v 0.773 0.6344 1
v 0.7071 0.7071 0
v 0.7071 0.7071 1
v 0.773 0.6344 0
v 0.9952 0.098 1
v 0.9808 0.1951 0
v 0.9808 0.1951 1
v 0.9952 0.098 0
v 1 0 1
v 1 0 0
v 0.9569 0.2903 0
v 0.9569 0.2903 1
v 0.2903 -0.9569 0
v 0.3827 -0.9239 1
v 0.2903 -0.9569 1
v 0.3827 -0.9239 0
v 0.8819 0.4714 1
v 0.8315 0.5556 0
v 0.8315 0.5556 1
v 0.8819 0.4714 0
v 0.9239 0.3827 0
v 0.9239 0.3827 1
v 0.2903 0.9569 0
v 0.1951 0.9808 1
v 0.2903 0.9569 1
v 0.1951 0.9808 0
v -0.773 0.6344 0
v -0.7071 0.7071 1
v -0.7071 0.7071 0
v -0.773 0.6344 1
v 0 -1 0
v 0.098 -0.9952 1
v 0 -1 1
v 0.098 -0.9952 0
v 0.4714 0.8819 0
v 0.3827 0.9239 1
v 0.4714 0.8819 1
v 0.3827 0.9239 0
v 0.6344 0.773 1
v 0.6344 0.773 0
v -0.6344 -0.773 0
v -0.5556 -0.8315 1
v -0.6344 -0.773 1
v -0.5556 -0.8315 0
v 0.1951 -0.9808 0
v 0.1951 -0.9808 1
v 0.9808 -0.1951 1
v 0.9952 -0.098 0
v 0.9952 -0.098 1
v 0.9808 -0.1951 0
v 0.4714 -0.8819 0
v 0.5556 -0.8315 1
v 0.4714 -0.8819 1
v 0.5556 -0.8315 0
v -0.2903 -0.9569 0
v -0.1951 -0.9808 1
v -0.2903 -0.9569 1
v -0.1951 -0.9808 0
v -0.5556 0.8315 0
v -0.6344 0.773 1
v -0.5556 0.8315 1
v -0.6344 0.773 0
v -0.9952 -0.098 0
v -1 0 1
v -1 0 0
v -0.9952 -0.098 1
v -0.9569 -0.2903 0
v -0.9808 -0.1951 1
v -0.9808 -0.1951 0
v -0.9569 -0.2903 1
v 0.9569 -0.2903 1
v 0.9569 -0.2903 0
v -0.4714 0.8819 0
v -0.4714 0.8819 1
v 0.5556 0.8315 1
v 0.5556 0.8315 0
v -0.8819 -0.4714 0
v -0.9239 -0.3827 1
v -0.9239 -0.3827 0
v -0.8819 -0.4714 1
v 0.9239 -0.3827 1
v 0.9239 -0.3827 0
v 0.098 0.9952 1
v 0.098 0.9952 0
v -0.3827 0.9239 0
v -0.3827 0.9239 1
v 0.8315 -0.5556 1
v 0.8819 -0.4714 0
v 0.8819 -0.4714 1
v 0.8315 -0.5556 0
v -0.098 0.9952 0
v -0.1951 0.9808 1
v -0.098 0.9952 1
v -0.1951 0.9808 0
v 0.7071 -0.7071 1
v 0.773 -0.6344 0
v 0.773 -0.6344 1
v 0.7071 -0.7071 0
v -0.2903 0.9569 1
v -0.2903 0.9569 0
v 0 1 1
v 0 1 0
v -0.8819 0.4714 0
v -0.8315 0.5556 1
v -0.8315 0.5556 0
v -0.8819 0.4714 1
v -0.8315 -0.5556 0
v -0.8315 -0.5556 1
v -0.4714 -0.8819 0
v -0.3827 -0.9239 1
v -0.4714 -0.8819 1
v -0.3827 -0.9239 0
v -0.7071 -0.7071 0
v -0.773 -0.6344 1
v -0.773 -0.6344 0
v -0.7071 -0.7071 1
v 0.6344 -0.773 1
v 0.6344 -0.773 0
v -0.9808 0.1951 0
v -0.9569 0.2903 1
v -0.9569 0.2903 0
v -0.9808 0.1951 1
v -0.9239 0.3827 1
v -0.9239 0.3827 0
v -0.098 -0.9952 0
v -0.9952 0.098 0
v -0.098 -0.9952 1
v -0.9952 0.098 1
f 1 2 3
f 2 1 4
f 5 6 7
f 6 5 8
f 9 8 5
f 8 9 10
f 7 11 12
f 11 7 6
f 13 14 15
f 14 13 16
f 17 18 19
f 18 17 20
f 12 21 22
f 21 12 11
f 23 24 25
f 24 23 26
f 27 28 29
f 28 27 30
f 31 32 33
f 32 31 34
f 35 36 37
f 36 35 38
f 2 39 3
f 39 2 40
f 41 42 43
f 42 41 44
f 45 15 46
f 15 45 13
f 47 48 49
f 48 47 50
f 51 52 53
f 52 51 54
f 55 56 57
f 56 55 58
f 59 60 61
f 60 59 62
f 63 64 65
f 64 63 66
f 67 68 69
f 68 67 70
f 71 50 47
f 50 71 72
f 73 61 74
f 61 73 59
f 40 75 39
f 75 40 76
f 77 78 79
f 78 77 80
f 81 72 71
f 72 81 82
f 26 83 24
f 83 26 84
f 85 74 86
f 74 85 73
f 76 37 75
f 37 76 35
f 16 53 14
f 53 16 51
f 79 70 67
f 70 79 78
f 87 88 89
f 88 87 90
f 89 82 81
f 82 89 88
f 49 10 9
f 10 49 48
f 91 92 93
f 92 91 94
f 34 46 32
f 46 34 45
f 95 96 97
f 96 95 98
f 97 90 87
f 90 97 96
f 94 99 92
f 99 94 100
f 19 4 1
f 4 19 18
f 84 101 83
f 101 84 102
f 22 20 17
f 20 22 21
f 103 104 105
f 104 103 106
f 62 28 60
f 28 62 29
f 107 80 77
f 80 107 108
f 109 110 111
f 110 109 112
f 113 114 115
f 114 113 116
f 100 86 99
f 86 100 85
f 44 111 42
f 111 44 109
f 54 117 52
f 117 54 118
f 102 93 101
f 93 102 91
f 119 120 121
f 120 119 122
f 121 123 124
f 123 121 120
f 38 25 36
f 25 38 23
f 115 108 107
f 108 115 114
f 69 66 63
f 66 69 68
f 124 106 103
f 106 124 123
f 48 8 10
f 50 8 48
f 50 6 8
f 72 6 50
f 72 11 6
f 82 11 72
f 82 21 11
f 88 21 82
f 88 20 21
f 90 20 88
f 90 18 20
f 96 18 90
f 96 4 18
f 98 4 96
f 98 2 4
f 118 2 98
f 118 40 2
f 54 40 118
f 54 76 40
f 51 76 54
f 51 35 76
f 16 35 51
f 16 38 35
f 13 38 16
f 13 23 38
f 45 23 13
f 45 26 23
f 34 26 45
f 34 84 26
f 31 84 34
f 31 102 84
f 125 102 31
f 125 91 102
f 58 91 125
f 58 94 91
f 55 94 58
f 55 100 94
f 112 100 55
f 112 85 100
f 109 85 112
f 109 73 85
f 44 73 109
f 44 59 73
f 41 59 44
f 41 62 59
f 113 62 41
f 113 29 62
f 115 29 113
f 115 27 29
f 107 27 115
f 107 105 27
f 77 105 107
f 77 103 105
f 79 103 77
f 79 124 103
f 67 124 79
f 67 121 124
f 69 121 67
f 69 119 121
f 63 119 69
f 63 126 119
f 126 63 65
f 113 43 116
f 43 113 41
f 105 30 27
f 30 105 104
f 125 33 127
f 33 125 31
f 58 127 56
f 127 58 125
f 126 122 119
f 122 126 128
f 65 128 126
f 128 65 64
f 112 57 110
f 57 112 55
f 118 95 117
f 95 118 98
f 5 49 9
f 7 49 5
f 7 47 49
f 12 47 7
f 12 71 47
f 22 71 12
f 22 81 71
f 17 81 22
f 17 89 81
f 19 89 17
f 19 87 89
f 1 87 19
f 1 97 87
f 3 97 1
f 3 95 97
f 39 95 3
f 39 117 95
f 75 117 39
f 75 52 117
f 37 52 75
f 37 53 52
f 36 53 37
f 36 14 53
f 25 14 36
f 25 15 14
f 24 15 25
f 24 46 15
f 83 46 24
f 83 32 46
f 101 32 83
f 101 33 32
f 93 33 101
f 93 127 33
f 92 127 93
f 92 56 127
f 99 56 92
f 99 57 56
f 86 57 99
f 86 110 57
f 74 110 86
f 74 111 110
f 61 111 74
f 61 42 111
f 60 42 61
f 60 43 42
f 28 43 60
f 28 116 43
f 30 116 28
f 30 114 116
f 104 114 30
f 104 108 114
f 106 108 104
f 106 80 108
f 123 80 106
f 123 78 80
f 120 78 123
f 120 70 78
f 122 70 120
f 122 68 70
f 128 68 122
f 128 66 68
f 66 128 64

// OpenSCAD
articulationAxisSubPiece();

/**
 * articulationAxisSubPiece
 * @name articulationAxisSubPiece
 * @description articlulation axis
 * @type subPiece
 */

module articulationAxisSubPiece(
    base_diameter,
    base_height,
    axis_diameter,
    axis_height,
    _fn = 64
) {
    cylinder(
        r = base_diameter / 2,
        h = base_height,
        $fn = _fn
    );
    translate(
        [
            0,
            0,
            base_height
        ]
    )
        cylinder(
            r = axis_diameter / 2,
            h = axis_height,
            $fn = _fn
        );

}
